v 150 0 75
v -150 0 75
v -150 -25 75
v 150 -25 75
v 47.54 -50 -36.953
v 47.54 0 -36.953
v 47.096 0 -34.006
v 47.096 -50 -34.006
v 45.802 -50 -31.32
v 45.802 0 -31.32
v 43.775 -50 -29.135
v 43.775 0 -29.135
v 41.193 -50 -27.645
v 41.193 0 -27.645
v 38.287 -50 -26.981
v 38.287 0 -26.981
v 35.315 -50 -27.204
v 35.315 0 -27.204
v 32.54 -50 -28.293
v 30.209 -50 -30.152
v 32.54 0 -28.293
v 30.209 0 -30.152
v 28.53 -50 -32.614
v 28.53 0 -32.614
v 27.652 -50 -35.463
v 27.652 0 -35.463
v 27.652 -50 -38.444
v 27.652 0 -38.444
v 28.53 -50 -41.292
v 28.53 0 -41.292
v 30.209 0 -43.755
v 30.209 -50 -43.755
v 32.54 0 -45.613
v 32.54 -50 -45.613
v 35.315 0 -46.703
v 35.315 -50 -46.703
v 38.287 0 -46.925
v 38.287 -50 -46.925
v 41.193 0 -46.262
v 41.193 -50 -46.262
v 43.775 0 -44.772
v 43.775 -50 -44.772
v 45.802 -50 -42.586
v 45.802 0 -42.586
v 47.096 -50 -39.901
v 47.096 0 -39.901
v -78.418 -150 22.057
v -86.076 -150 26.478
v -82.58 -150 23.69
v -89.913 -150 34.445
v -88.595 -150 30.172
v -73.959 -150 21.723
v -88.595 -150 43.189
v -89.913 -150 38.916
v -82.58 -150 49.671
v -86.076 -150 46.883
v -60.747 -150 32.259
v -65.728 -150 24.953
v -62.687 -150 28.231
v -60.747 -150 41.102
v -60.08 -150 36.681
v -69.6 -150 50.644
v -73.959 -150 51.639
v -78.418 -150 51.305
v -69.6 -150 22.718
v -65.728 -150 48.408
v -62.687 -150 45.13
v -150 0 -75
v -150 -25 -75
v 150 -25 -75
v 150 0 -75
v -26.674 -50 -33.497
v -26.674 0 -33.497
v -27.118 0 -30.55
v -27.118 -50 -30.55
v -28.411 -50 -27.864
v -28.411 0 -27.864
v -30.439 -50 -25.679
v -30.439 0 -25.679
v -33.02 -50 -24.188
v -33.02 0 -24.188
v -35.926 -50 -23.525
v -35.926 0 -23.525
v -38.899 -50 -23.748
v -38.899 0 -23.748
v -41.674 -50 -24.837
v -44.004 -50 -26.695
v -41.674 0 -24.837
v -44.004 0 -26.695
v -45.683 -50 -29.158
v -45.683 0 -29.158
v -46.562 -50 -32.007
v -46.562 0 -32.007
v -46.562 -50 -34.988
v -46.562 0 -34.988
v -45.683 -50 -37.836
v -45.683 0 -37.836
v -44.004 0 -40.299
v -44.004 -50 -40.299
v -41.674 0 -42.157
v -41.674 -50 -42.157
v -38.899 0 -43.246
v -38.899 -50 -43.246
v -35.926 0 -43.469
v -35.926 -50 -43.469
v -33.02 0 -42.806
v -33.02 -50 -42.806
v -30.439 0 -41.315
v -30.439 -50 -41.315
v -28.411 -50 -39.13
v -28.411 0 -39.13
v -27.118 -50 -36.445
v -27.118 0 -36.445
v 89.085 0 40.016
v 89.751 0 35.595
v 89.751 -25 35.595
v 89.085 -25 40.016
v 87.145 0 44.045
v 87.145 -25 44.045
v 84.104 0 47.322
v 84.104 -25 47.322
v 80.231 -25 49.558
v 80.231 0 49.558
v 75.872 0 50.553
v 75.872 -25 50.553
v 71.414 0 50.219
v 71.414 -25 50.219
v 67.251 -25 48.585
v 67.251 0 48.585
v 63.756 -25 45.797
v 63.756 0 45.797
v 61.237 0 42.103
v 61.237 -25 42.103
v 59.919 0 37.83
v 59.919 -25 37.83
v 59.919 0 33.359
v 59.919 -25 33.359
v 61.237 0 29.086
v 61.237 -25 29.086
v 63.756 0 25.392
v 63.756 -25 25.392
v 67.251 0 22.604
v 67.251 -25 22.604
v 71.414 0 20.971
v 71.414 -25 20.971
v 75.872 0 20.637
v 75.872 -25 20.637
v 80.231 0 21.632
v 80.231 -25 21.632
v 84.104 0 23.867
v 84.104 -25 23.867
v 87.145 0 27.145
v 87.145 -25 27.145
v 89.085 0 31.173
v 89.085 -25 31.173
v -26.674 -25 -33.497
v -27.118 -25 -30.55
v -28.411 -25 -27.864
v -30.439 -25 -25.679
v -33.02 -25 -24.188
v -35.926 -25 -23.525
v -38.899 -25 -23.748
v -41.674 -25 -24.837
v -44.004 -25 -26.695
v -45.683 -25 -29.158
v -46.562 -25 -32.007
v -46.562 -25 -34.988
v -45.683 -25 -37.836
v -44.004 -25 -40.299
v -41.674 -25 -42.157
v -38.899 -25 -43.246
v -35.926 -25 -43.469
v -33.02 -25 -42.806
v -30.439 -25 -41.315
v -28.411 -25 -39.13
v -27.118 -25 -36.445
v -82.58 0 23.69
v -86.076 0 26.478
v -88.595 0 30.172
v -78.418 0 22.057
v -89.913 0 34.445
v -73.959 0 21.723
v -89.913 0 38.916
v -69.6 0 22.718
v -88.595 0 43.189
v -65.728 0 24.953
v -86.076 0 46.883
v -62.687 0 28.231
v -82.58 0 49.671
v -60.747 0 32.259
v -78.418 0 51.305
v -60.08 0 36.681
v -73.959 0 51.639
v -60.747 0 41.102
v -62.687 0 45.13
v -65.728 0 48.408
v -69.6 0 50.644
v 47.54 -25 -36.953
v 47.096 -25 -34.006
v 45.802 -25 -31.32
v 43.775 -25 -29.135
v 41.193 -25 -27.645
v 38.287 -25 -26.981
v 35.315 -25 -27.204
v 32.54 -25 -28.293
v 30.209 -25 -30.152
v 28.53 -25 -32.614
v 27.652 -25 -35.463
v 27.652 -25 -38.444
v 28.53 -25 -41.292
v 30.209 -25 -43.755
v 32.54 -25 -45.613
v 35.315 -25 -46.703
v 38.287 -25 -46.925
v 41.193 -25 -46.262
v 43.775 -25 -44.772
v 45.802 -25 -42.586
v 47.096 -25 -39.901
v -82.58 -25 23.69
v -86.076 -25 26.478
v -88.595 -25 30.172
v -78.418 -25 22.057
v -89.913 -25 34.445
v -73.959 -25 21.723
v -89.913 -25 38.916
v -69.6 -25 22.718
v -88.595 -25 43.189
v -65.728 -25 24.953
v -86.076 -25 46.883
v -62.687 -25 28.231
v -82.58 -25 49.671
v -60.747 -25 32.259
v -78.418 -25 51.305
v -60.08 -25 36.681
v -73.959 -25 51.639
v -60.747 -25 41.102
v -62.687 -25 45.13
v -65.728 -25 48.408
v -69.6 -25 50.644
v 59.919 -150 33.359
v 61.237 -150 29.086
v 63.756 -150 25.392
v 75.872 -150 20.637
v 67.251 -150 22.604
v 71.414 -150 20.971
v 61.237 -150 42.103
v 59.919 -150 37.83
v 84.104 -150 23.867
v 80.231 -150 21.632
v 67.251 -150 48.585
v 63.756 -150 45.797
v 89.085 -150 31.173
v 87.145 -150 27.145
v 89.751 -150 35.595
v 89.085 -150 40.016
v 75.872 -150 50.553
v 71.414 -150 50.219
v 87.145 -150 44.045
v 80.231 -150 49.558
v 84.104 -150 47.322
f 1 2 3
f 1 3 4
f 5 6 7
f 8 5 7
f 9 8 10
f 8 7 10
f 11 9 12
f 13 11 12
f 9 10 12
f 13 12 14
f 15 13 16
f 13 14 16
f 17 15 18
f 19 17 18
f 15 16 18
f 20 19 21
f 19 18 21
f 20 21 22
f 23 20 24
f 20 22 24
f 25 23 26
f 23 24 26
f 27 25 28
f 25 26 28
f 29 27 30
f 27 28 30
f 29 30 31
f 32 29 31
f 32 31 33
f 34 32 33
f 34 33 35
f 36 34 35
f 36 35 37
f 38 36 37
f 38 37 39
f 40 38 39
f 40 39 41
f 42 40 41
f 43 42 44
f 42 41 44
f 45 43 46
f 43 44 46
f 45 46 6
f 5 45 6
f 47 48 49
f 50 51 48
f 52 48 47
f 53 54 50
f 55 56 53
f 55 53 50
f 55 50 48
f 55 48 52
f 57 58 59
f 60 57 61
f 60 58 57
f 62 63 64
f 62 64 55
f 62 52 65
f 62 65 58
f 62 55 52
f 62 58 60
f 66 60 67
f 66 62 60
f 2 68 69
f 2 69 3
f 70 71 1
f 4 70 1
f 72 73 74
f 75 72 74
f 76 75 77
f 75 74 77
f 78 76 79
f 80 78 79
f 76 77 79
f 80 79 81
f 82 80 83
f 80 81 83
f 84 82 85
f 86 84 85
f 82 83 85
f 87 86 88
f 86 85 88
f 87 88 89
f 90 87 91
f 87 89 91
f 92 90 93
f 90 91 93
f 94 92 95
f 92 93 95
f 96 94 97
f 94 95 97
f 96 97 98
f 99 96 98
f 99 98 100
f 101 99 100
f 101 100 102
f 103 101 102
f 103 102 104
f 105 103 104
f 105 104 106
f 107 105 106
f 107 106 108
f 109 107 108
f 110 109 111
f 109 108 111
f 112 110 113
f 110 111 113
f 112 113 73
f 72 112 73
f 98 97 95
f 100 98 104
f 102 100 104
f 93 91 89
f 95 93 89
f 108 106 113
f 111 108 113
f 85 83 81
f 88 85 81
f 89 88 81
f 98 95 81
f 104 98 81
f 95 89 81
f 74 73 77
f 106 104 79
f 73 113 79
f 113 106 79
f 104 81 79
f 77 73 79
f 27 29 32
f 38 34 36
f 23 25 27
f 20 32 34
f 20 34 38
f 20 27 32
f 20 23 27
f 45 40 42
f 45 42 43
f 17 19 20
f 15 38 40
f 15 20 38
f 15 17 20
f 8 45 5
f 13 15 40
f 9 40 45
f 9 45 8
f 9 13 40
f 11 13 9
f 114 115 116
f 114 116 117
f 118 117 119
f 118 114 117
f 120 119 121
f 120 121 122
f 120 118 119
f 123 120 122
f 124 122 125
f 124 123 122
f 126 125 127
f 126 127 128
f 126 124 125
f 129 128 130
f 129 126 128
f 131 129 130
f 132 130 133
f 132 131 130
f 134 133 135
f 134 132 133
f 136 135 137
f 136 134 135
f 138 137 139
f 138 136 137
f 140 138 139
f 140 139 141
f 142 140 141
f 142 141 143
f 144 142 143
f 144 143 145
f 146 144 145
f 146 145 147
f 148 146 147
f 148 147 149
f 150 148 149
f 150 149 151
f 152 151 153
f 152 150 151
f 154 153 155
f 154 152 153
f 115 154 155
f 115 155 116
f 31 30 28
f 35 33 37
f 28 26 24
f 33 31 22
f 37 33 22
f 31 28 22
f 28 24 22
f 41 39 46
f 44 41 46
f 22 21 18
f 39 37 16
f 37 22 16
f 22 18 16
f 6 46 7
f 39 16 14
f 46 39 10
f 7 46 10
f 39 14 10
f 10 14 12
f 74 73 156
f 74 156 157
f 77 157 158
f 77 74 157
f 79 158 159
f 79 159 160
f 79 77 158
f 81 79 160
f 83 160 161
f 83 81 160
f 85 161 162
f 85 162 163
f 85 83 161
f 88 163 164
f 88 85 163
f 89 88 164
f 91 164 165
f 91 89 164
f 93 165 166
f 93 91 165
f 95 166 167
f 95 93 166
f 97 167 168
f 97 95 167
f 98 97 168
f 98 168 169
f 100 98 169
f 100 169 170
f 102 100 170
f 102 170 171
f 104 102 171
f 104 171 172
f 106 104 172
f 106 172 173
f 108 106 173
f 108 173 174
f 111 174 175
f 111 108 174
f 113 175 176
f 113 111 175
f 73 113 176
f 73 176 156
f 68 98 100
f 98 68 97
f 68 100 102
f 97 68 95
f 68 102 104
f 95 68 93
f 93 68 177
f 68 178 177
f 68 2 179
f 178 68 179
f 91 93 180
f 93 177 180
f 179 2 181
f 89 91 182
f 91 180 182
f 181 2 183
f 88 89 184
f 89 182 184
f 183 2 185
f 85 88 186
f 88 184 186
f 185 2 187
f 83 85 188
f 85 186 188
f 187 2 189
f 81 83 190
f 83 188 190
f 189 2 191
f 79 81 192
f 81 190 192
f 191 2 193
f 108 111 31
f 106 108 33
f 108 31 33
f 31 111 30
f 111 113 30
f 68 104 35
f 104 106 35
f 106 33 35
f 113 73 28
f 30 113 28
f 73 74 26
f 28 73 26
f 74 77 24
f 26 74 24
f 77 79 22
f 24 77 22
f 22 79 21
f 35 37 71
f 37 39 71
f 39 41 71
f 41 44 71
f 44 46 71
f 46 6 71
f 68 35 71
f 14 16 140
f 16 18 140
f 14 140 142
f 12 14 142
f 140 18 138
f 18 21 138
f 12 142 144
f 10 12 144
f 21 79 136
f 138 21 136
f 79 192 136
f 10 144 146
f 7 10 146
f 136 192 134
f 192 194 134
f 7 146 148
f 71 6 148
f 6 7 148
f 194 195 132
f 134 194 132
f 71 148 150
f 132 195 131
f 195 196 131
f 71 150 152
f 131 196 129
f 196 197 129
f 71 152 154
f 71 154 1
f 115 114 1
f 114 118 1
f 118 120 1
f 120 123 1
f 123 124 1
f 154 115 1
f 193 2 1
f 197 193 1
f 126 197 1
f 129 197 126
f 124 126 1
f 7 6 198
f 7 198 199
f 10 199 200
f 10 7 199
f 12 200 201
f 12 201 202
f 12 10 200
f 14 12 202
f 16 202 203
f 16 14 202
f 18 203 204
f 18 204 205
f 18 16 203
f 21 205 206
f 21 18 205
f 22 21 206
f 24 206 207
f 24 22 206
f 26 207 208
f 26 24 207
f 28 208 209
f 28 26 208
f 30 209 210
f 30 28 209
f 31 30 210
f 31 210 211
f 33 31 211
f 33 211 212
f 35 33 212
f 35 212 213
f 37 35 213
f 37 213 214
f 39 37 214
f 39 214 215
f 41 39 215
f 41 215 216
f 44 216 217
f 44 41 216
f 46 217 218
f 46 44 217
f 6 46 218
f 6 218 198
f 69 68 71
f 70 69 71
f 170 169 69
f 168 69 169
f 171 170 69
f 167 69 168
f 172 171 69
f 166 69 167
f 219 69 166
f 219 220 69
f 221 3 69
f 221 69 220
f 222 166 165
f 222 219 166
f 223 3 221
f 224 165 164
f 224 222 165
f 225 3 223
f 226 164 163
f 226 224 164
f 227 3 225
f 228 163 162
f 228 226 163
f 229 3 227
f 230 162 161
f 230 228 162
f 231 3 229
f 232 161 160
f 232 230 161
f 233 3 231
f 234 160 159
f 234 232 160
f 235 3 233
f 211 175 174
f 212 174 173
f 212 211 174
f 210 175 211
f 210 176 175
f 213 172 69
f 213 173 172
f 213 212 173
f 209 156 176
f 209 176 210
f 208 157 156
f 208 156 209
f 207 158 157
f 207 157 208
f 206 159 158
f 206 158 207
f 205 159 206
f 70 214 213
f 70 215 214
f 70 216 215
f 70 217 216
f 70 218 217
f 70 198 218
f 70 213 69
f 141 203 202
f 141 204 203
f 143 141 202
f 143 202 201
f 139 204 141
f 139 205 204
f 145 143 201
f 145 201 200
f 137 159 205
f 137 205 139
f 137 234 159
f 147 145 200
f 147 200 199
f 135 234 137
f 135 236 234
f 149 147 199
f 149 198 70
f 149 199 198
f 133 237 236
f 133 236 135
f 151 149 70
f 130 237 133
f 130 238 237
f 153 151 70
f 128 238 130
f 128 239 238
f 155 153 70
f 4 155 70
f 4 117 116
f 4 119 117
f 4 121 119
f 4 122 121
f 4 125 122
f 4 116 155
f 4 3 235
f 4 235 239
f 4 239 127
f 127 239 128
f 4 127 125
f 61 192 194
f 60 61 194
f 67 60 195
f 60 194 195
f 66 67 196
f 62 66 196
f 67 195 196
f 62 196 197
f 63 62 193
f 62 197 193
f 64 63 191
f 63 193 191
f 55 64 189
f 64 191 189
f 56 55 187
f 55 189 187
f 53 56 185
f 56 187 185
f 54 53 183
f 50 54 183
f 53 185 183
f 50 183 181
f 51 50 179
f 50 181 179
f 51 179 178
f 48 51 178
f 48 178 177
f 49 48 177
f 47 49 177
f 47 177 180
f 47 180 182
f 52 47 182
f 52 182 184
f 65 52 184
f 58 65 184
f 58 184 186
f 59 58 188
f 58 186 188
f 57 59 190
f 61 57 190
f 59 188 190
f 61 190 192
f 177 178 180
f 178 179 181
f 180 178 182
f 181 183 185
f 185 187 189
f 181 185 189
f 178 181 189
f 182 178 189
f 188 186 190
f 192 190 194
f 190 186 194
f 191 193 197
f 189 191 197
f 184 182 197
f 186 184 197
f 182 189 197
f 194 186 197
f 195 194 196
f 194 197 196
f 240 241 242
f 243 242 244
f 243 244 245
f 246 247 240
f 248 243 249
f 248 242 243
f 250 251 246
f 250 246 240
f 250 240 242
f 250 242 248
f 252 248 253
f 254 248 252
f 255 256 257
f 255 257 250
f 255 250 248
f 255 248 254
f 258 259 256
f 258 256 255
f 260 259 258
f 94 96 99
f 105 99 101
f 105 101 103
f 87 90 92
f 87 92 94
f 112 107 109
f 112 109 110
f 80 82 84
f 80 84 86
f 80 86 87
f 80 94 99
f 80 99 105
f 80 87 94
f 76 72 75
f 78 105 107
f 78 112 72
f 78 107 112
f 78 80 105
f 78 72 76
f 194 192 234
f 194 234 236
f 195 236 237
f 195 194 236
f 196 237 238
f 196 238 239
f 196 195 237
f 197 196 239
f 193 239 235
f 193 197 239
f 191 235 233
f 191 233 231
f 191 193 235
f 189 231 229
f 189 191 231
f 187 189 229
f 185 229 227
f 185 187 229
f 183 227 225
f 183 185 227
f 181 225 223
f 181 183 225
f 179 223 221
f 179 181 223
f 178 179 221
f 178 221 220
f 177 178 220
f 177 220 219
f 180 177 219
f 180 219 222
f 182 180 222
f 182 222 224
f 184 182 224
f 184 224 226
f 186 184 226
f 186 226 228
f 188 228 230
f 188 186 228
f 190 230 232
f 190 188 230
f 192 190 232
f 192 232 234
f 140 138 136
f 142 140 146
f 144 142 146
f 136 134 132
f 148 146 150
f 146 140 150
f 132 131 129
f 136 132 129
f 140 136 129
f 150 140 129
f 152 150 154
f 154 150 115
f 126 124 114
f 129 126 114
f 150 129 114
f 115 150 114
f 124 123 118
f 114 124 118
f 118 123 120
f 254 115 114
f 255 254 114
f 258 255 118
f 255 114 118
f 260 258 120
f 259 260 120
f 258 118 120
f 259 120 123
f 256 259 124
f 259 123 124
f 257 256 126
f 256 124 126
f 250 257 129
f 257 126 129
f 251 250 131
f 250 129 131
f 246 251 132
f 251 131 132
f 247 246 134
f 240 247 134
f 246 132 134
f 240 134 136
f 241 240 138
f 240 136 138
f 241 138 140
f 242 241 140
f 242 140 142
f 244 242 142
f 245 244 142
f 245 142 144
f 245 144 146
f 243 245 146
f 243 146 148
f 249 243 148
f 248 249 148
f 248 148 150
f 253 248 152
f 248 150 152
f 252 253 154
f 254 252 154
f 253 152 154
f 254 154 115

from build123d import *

# Parameters (mm, degrees)
F0_R     = 15
F1_DEPTH = 150
F0_R_2   = 10
F2_DEPTH = 50
F0_W     = 300
F0_H     = 150
F3_DEPTH = 25


with BuildPart() as f1:
    # F0 (on Front) → F1 (new body)
    with BuildSketch(Plane.XZ):
        with Locations((74.751347, 35.594754)):
            Circle(F0_R)
        with Locations((-75.080156, 36.680624)):
            Circle(F0_R)
    extrude(amount=F1_DEPTH)


with BuildPart() as f2:
    # F0 (on Front) → F2 (new body)
    with BuildSketch(Plane.XZ):
        with Locations((37.539899, -36.953241)):
            Circle(F0_R_2)
        with Locations((-36.673635, -33.49714)):
            Circle(F0_R_2)
    extrude(amount=F2_DEPTH)


with BuildPart() as f3:
    # F0 (on Front) → F3 (new body)
    with BuildSketch(Plane.XZ):
        Rectangle(F0_W, F0_H)
        with Locations((-36.673635, -33.49714)):
            Circle(F0_R_2, mode=Mode.SUBTRACT)
        with Locations((37.539899, -36.953241)):
            Circle(F0_R_2, mode=Mode.SUBTRACT)
        with Locations((-75.080156, 36.680624)):
            Circle(F0_R, mode=Mode.SUBTRACT)
        with Locations((74.751347, 35.594754)):
            Circle(F0_R, mode=Mode.SUBTRACT)
    extrude(amount=F3_DEPTH)


solid = Compound([f1.part, f2.part, f3.part])
